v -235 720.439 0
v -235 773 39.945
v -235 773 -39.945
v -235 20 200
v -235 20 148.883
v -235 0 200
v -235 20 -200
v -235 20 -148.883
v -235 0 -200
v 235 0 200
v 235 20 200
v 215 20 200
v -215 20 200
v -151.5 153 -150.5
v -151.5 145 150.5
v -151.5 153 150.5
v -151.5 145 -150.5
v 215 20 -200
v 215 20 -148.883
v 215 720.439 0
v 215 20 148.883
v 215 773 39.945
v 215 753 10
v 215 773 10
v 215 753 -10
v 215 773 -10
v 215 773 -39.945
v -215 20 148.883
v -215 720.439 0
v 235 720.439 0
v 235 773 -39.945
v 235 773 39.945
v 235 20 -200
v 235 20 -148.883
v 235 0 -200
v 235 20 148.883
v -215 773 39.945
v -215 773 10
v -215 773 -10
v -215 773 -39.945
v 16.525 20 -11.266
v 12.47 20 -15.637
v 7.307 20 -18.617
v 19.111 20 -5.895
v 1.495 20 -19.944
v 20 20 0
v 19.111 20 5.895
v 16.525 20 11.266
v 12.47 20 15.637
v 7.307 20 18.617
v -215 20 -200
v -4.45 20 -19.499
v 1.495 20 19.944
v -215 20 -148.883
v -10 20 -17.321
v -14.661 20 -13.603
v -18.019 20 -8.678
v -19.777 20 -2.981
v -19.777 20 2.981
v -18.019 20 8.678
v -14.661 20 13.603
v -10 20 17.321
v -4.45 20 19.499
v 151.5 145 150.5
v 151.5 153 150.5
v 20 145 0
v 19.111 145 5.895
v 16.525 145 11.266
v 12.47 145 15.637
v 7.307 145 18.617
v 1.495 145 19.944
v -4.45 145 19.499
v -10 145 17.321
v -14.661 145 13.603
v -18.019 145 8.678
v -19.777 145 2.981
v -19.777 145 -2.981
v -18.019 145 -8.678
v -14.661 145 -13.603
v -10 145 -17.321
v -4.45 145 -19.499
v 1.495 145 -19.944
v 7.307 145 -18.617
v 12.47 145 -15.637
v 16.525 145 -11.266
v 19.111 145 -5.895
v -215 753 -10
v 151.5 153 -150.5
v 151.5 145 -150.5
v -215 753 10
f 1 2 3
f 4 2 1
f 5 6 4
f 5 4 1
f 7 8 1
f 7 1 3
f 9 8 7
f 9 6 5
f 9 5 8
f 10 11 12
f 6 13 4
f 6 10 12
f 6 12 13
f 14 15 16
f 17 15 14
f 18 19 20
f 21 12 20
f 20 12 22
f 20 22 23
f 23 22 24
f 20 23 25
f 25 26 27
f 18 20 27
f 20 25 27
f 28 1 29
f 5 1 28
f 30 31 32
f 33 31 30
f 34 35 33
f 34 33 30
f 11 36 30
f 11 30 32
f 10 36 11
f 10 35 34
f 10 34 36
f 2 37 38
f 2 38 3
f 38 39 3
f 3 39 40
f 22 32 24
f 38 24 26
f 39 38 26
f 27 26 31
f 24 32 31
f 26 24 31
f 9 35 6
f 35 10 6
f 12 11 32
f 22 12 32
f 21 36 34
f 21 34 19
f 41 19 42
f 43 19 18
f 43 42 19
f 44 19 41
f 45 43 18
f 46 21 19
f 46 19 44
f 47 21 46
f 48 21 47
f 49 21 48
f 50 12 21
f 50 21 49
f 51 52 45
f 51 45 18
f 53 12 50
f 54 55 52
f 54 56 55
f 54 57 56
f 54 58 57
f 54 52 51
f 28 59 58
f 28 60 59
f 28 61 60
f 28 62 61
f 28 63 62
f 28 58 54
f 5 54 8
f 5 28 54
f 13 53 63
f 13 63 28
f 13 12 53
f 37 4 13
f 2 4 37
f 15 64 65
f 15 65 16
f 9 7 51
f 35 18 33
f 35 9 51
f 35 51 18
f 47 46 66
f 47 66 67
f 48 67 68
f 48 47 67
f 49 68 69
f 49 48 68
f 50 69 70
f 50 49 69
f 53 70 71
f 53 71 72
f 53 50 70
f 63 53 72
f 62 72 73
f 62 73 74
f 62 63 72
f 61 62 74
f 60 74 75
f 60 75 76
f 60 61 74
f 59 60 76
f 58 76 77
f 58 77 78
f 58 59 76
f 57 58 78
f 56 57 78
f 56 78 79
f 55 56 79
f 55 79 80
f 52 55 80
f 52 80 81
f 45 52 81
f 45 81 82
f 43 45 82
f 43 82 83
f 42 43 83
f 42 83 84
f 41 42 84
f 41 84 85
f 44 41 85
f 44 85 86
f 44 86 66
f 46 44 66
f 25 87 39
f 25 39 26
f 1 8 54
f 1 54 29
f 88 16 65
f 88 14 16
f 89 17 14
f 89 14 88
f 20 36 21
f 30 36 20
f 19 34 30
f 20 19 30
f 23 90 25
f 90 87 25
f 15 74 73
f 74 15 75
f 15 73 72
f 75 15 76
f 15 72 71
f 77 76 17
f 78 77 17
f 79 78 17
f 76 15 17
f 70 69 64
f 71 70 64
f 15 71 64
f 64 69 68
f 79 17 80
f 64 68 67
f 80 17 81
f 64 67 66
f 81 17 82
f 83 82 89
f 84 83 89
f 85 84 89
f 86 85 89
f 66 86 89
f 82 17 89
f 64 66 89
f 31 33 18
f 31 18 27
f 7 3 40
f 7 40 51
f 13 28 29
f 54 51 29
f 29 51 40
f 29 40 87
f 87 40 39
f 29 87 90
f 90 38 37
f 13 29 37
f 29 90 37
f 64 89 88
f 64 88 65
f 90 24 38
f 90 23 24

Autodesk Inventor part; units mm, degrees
ref_plane "YZ Plane" through (0, 0, 0) normal (1, 0, 0) x (0, 1, 0)
ref_plane "XZ Plane" through (0, 0, 0) normal (0, 1, 0) x (-1, 0, 0)
sketch "Sketch1" plane through (0, 0, 0) normal (0, 1, 0) x (-1, 0, 0)
  line L0 (235, -200) -> (-235, -200)
  line L1 (-235, -200) -> (-235, 200)
  line L2 (-235, 200) -> (235, 200)
  line L3 (235, 200) -> (235, -200)
  line L4 (329, 0) -> (-329, 0) projected
  line L5 (0, -280) -> (0, 280) projected
  point P0 (0, 0)
  dimension "d0" = 470
  dimension "d1" = 400
extrude "Extrusion1" add sketch "Sketch1" along normal blind 20
sketch "Sketch2" plane through (0, 20, 0) normal (0, 1, 0) x (1, 0, 0)
  line L0 (-235, -200) -> (235, -200) projected
  line L1 (235, -200) -> (235, 200) projected
  line L2 (235, 200) -> (-235, 200) projected
  line L3 (-235, 200) -> (-235, -200) projected
  line L4 (-329, 0) -> (329, 0) projected
  line L5 (0, 280) -> (0, -280) projected
  circle A0 centre (0, 0) radius 20
  dimension "d4" = 40
extrude "Extrusion2" add sketch "Sketch2" along normal blind 125 contours A0 L4 L5 | L5 L4 A0 | A0 L5 L4 | L5 A0 L4
sketch "Sketch3" plane through (0, 145, 0) normal (0, 1, 0) x (1, 0, 0)
  line L0 (-151.5, 150.5) -> (151.5, 150.5)
  line L1 (151.5, 150.5) -> (151.5, -150.5)
  line L2 (151.5, -150.5) -> (-151.5, -150.5)
  line L3 (-151.5, -150.5) -> (-151.5, 150.5)
  line L4 (-329, 0) -> (329, 0) projected
  line L5 (0, 280) -> (0, -280) projected
  point P0 (0, 0)
  dimension "d7" = 303
  dimension "d8" = 301
extrude "Extrusion3" add sketch "Sketch3" along normal blind 8
ref_plane "Work Plane1" through (0, 753, 0) normal (0, 1, 0) x (1, 0, 0)
sketch "Sketch4" plane through (0, 753, 0) normal (0, 1, 0) x (1, 0, 0)
  line L0 (-235, 10) -> (235, 10)
  line L1 (235, 10) -> (235, -10)
  line L2 (235, -10) -> (-235, -10)
  line L3 (-235, -10) -> (-235, 10)
  circle A0 centre (0, 0) radius 20 projected
  line L4 (-235, -200) -> (235, -200) projected
  line L5 (235, -200) -> (235, 200) projected
  line L6 (235, 200) -> (-235, 200) projected
  line L7 (-235, 200) -> (-235, -200) projected
  line L8 (-329, 0) -> (329, 0) projected
  line L9 (0, 280) -> (0, -280) projected
  dimension "d12" = 20
extrude "Extrusion4" add sketch "Sketch4" along normal blind 20 contours L0 A0 L8 L3 | L0 L9 L8 A0 | L8 A0 L2 L3 | L0 A0 L8 L9 | L8 L9 L2 A0 | L0 L1 L8 A0 | L8 A0 L2 L9 | L8 L1 L2 A0
sketch "Sketch5" plane through (235, 0, 200) normal (1, 0, 0) x (0, 0, -1)
  line L0 (190, 753) -> (210, 753) projected
  line L1 (210, 753) -> (210, 773) projected
  line L2 (190, 773) -> (210, 773) projected
  line L3 (190, 753) -> (190, 773) projected
  line L4 (0, 0) -> (400, 0) projected
  line L5 (0, 20) -> (400, 20) projected
  line L6 (0, 0) -> (0, 20) projected
  line L7 (400, 0) -> (400, 20) projected
  line L8 (0, 0) -> (400, 0) projected
  line L9 (400, 0) -> (400, 20) projected
  line L10 (0, 20) -> (400, 20) projected
  line L11 (0, 0) -> (0, 20) projected
  line L12 (160.0551, 773) -> (239.9449, 773)
  line L13 (0, 20) -> (160.0551, 773)
  line L14 (200, -184.6) -> (200, 1107.6) projected
  line L15 (400, 20) -> (239.9449, 773)
  line L16 (190, 773) -> (210, 773) projected
  line L17 (0, 20) -> (51.117, 20)
  line L18 (348.883, 20) -> (400, 20)
  line L19 (348.883, 20) -> (200, 720.4393)
  line L20 (51.117, 20) -> (200, 720.4393)
  line L21 (150, 690) -> (250, 690) construction
  line L22 (250, 690) -> (250, 563) construction
  line L23 (250, 563) -> (150, 563) construction
  line L24 (150, 563) -> (150, 690) construction
  point P0 (200, 0)
  point P1 (183.5455, 773)
  point P2 (216.4545, 773)
  dimension "d16" = 78
  dimension "d18" = 78
  dimension "d26" = 50
  dimension "d27" = 100
  dimension "d28" = 127
  dimension "d29" = 670
extrude "Extrusion5" add sketch "Sketch5" against normal blind 20 contours L3 L2 L14 L0 | L0 L14 L20 L5 L13 L12 L3 | L14 L2 L1 L0 | L0 L1 L12 L15 L5 L19 L14
sketch "Sketch6" plane through (-235, 753, -10) normal (-1, 0, 0) x (0, 0, 1)
  line L0 (-40, -60) -> (60, -60) construction
  line L1 (60, -60) -> (60, -188) construction
  line L2 (60, -188) -> (-40, -188) construction
  line L3 (-40, -188) -> (-40, -60) construction
  line L4 (10, -925.1189) -> (10, 279.7131) projected
  line L5 (0, 0) -> (20, 0) projected
  line L6 (20, 0) -> (20, 20) projected
  line L7 (0, 20) -> (20, 20) projected
  line L8 (0, 0) -> (0, 20) projected
  line L9 (20, 0) -> (20, 20) projected
  line L10 (0, 0) -> (20, 0) projected
  line L11 (0, 20) -> (0, 0) projected
  line L12 (0, 20) -> (-29.9449, 20) projected
  line L13 (-29.9449, 20) -> (-190, -733) projected
  line L14 (-138.883, -733) -> (-190, -733) projected
  line L15 (210, -733) -> (49.9449, 20) projected
  line L16 (49.9449, 20) -> (20, 20) projected
  line L17 (-29.9449, 20) -> (-190, -733) projected
  line L18 (-190, -733) -> (-29.9449, 20)
  line L19 (-29.9449, 20) -> (49.9449, 20)
  line L20 (210, -733) -> (49.9449, 20)
  line L21 (159.2287, -733) -> (210, -733)
  line L22 (159.2287, -733) -> (39.7909, 107.5943)
  line L23 (-138.883, -733) -> (39.7909, 107.5943) projected
  line L24 (39.7909, 107.5943) -> (-138.883, -733)
  line L25 (-138.883, -733) -> (-190, -733)
  line L26 (-138.883, -733) -> (10, -32.5607) projected
  line L27 (10, -32.5607) -> (158.883, -733) projected
  line L28 (210, -733) -> (158.883, -733) projected
  point P0 (10, -753)
  point P1 (0, 20)
  dimension "d21" = 100
  dimension "d22" = 128
  dimension "d23" = 60
extrude "Extrusion6" add sketch "Sketch6" against normal blind 20 contours L23 L14 L13 L12 L8 L5 L4 | L4 L5 L23 | L23 L5 L6 L16 L15 L22 L28 L27 | L6 L16 L23 | L22 L15 L21
properties part number "Estructura AA"
